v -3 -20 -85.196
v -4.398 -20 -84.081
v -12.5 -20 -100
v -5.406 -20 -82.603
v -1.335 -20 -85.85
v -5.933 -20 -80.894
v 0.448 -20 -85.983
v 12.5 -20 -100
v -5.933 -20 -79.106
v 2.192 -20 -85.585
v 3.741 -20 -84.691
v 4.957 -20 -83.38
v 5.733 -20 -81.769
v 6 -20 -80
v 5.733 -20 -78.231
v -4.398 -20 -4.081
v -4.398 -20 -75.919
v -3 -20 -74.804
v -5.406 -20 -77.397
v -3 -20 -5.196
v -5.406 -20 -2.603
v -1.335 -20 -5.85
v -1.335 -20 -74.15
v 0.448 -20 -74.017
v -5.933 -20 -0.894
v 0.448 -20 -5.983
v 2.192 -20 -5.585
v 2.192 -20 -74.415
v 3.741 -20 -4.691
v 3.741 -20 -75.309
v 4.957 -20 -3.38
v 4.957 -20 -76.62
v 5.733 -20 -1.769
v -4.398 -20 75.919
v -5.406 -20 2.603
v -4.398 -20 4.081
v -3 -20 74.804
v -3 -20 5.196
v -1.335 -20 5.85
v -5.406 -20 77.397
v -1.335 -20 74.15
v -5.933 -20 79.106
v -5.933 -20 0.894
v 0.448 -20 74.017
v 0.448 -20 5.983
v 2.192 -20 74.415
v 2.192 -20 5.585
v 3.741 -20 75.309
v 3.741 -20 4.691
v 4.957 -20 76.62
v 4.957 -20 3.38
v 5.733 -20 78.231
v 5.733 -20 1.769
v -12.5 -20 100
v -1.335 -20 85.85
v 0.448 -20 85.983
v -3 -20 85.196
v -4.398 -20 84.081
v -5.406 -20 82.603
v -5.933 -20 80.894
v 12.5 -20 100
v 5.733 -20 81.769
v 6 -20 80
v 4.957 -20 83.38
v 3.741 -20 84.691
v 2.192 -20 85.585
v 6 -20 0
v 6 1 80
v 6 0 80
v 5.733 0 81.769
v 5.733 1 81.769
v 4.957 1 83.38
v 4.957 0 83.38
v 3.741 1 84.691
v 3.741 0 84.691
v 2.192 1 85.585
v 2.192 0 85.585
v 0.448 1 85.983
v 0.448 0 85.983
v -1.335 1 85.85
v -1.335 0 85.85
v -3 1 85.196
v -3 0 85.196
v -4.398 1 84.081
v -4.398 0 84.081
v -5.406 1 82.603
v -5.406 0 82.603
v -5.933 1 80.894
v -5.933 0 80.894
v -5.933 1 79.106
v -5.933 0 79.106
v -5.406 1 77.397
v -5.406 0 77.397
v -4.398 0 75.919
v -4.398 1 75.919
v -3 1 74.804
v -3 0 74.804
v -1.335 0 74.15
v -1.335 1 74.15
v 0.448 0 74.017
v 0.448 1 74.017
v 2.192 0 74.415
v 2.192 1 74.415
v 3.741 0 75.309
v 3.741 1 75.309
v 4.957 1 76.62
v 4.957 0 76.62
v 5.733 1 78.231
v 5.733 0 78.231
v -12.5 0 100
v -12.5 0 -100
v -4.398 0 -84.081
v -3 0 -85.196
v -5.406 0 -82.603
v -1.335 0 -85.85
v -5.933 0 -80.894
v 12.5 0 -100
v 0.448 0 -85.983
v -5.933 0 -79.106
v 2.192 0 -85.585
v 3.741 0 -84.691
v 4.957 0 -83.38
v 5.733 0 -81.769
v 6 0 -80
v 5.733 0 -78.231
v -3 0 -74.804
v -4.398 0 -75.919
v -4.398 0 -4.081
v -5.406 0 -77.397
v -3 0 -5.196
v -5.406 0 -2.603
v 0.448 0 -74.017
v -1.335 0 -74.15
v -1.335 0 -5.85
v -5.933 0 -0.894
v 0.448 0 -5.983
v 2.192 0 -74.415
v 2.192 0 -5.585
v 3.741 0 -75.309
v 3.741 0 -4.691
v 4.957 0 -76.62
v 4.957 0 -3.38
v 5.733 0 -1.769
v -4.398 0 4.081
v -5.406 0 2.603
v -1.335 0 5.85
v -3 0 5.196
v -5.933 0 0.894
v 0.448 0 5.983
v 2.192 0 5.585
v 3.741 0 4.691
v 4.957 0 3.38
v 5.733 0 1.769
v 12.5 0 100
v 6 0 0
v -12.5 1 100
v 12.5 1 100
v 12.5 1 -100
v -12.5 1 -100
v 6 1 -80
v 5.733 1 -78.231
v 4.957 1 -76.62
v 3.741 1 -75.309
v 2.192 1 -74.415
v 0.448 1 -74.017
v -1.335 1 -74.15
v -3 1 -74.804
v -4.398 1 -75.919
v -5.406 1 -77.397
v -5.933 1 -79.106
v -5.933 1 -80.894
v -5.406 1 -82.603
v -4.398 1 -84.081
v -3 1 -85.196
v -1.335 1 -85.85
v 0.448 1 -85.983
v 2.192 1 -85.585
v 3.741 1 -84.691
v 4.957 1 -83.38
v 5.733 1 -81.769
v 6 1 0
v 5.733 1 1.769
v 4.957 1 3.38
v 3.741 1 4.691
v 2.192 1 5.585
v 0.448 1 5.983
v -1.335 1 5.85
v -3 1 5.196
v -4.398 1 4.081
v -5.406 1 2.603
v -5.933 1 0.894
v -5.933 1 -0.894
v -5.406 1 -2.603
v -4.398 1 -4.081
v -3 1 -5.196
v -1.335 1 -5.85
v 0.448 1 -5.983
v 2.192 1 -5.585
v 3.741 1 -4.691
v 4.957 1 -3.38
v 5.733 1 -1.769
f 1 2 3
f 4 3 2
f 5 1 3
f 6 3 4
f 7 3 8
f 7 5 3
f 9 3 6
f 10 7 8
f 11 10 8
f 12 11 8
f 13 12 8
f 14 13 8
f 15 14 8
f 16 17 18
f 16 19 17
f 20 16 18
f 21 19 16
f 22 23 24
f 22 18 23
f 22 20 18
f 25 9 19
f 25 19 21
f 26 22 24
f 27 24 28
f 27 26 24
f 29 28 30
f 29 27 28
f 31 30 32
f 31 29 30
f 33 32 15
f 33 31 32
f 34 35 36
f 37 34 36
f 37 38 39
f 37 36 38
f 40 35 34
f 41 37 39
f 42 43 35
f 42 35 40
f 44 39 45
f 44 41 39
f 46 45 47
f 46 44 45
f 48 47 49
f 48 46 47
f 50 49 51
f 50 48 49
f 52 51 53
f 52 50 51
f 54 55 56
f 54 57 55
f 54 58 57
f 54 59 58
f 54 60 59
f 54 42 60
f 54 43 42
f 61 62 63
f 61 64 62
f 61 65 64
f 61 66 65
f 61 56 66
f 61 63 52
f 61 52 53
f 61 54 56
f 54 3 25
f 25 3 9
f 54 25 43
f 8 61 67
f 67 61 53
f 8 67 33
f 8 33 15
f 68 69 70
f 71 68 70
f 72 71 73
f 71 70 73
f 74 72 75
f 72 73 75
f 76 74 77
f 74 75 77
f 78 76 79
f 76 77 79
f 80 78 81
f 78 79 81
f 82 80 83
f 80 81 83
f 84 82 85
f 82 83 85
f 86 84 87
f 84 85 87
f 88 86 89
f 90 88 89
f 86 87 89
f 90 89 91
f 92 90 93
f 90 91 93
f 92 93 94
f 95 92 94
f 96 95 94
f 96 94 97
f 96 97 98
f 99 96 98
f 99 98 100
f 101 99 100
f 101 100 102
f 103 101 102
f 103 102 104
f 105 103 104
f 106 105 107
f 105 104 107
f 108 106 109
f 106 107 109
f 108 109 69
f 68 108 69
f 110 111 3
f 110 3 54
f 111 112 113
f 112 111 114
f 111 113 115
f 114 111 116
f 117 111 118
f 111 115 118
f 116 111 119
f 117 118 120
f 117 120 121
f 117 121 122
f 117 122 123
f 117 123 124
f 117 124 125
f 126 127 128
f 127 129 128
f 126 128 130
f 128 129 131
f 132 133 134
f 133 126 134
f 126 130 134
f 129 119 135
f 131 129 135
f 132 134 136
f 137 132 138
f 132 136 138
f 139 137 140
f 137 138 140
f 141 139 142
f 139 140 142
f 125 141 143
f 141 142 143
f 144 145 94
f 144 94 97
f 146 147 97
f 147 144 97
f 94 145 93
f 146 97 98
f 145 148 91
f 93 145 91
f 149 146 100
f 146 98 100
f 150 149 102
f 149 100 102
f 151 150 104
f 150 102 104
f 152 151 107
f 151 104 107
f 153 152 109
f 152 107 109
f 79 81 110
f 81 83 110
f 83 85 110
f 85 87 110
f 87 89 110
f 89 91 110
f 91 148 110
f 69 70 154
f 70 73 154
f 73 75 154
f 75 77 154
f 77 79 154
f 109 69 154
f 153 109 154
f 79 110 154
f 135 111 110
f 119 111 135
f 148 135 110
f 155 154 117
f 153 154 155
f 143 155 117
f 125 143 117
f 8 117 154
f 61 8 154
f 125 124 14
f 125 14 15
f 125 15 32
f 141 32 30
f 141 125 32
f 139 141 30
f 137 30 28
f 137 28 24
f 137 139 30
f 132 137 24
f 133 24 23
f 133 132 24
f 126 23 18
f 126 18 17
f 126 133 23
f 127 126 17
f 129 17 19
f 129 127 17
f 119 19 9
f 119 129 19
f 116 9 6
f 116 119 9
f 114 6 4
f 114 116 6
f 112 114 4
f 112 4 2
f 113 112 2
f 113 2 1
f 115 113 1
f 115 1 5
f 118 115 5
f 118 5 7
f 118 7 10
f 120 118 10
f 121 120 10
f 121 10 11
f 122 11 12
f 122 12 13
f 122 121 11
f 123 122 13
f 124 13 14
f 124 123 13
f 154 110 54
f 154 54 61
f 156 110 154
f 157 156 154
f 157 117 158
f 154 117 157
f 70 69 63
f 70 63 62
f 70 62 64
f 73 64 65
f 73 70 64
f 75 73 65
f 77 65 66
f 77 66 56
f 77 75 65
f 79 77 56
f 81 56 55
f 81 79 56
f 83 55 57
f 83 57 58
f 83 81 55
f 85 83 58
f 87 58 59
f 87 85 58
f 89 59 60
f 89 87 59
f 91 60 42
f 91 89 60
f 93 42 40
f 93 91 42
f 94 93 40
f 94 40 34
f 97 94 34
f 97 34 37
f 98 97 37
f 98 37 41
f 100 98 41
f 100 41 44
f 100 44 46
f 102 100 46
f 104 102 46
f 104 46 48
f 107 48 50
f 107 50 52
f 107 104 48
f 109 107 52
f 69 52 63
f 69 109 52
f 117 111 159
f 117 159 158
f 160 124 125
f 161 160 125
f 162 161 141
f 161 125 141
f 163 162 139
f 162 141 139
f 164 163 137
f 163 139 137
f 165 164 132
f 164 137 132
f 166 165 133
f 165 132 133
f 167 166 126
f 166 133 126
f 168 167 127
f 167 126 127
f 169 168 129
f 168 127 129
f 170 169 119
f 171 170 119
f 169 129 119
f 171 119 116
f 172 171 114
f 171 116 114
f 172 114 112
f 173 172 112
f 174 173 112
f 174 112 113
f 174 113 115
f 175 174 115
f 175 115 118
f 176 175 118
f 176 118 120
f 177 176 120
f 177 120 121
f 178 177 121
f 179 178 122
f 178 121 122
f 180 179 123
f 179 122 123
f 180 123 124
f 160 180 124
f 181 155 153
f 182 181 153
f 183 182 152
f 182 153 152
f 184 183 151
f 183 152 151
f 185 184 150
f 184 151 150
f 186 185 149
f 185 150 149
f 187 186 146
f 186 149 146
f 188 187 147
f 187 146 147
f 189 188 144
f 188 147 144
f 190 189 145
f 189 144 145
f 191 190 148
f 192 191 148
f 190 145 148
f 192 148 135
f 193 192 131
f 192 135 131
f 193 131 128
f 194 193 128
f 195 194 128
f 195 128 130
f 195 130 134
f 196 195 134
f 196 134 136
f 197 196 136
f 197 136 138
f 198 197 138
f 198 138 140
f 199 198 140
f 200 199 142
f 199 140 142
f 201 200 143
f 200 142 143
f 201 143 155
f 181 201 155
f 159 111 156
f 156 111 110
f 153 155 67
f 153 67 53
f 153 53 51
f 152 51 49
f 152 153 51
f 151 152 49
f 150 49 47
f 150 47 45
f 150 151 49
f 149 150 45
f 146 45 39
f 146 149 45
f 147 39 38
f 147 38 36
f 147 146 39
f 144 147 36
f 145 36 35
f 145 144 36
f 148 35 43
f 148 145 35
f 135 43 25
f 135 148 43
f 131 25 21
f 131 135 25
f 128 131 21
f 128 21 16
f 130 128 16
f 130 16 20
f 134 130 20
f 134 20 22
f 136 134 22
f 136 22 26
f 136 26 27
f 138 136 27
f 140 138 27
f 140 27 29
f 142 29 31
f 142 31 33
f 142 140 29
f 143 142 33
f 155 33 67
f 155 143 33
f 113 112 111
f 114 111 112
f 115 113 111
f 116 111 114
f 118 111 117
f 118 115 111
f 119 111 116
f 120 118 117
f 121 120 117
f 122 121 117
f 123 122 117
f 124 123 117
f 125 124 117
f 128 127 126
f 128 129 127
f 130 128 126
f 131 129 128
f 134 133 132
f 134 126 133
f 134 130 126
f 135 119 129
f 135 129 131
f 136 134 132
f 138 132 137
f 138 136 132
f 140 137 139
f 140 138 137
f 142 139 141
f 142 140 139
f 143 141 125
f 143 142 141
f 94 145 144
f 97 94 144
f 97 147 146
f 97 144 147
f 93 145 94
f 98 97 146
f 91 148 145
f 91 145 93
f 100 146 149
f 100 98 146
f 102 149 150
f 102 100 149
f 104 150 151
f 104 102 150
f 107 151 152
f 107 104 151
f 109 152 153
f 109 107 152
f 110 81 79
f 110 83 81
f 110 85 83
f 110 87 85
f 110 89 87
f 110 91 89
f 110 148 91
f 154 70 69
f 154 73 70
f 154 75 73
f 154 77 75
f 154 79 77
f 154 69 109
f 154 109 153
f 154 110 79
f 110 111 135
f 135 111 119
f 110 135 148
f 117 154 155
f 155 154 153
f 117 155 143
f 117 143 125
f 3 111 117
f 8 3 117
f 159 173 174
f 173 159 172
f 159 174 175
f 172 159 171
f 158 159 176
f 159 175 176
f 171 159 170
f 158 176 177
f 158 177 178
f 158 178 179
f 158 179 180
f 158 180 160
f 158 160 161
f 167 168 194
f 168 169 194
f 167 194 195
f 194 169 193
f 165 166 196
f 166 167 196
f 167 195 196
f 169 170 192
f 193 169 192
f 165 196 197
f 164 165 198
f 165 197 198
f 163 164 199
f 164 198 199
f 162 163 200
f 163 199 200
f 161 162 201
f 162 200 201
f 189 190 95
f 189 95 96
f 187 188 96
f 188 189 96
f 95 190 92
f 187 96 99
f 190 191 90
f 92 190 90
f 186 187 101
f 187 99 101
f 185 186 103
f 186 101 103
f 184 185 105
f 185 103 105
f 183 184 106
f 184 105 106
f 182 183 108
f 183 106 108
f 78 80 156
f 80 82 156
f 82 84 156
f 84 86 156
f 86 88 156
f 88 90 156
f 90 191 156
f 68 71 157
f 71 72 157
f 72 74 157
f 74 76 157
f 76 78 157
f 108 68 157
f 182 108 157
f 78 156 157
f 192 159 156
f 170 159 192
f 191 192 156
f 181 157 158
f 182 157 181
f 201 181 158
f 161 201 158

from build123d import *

# Parameters (mm, degrees)
F0_W     = 25
F0_H     = 200
F0_R     = 6
F1_DEPTH = 20
F2_DEPTH = 1


with BuildPart() as f1:
    # F0 (on Front) → F1 (new body)
    with BuildSketch(Plane.XZ):
        Rectangle(F0_W, F0_H)
        with Locations((0, -80)):
            Circle(F0_R, mode=Mode.SUBTRACT)
        Circle(F0_R, mode=Mode.SUBTRACT)
        with Locations((0, 80)):
            Circle(F0_R, mode=Mode.SUBTRACT)
    extrude(amount=F1_DEPTH)


with BuildPart() as f2:
    # F0 (on Front) → F2 (new body)
    with BuildSketch(Plane.XZ):
        Rectangle(F0_W, F0_H)
        with Locations((0, -80)):
            Circle(F0_R, mode=Mode.SUBTRACT)
        Circle(F0_R, mode=Mode.SUBTRACT)
        with Locations((0, 80)):
            Circle(F0_R, mode=Mode.SUBTRACT)
    extrude(amount=-F2_DEPTH)


solid = Compound([f1.part, f2.part])
